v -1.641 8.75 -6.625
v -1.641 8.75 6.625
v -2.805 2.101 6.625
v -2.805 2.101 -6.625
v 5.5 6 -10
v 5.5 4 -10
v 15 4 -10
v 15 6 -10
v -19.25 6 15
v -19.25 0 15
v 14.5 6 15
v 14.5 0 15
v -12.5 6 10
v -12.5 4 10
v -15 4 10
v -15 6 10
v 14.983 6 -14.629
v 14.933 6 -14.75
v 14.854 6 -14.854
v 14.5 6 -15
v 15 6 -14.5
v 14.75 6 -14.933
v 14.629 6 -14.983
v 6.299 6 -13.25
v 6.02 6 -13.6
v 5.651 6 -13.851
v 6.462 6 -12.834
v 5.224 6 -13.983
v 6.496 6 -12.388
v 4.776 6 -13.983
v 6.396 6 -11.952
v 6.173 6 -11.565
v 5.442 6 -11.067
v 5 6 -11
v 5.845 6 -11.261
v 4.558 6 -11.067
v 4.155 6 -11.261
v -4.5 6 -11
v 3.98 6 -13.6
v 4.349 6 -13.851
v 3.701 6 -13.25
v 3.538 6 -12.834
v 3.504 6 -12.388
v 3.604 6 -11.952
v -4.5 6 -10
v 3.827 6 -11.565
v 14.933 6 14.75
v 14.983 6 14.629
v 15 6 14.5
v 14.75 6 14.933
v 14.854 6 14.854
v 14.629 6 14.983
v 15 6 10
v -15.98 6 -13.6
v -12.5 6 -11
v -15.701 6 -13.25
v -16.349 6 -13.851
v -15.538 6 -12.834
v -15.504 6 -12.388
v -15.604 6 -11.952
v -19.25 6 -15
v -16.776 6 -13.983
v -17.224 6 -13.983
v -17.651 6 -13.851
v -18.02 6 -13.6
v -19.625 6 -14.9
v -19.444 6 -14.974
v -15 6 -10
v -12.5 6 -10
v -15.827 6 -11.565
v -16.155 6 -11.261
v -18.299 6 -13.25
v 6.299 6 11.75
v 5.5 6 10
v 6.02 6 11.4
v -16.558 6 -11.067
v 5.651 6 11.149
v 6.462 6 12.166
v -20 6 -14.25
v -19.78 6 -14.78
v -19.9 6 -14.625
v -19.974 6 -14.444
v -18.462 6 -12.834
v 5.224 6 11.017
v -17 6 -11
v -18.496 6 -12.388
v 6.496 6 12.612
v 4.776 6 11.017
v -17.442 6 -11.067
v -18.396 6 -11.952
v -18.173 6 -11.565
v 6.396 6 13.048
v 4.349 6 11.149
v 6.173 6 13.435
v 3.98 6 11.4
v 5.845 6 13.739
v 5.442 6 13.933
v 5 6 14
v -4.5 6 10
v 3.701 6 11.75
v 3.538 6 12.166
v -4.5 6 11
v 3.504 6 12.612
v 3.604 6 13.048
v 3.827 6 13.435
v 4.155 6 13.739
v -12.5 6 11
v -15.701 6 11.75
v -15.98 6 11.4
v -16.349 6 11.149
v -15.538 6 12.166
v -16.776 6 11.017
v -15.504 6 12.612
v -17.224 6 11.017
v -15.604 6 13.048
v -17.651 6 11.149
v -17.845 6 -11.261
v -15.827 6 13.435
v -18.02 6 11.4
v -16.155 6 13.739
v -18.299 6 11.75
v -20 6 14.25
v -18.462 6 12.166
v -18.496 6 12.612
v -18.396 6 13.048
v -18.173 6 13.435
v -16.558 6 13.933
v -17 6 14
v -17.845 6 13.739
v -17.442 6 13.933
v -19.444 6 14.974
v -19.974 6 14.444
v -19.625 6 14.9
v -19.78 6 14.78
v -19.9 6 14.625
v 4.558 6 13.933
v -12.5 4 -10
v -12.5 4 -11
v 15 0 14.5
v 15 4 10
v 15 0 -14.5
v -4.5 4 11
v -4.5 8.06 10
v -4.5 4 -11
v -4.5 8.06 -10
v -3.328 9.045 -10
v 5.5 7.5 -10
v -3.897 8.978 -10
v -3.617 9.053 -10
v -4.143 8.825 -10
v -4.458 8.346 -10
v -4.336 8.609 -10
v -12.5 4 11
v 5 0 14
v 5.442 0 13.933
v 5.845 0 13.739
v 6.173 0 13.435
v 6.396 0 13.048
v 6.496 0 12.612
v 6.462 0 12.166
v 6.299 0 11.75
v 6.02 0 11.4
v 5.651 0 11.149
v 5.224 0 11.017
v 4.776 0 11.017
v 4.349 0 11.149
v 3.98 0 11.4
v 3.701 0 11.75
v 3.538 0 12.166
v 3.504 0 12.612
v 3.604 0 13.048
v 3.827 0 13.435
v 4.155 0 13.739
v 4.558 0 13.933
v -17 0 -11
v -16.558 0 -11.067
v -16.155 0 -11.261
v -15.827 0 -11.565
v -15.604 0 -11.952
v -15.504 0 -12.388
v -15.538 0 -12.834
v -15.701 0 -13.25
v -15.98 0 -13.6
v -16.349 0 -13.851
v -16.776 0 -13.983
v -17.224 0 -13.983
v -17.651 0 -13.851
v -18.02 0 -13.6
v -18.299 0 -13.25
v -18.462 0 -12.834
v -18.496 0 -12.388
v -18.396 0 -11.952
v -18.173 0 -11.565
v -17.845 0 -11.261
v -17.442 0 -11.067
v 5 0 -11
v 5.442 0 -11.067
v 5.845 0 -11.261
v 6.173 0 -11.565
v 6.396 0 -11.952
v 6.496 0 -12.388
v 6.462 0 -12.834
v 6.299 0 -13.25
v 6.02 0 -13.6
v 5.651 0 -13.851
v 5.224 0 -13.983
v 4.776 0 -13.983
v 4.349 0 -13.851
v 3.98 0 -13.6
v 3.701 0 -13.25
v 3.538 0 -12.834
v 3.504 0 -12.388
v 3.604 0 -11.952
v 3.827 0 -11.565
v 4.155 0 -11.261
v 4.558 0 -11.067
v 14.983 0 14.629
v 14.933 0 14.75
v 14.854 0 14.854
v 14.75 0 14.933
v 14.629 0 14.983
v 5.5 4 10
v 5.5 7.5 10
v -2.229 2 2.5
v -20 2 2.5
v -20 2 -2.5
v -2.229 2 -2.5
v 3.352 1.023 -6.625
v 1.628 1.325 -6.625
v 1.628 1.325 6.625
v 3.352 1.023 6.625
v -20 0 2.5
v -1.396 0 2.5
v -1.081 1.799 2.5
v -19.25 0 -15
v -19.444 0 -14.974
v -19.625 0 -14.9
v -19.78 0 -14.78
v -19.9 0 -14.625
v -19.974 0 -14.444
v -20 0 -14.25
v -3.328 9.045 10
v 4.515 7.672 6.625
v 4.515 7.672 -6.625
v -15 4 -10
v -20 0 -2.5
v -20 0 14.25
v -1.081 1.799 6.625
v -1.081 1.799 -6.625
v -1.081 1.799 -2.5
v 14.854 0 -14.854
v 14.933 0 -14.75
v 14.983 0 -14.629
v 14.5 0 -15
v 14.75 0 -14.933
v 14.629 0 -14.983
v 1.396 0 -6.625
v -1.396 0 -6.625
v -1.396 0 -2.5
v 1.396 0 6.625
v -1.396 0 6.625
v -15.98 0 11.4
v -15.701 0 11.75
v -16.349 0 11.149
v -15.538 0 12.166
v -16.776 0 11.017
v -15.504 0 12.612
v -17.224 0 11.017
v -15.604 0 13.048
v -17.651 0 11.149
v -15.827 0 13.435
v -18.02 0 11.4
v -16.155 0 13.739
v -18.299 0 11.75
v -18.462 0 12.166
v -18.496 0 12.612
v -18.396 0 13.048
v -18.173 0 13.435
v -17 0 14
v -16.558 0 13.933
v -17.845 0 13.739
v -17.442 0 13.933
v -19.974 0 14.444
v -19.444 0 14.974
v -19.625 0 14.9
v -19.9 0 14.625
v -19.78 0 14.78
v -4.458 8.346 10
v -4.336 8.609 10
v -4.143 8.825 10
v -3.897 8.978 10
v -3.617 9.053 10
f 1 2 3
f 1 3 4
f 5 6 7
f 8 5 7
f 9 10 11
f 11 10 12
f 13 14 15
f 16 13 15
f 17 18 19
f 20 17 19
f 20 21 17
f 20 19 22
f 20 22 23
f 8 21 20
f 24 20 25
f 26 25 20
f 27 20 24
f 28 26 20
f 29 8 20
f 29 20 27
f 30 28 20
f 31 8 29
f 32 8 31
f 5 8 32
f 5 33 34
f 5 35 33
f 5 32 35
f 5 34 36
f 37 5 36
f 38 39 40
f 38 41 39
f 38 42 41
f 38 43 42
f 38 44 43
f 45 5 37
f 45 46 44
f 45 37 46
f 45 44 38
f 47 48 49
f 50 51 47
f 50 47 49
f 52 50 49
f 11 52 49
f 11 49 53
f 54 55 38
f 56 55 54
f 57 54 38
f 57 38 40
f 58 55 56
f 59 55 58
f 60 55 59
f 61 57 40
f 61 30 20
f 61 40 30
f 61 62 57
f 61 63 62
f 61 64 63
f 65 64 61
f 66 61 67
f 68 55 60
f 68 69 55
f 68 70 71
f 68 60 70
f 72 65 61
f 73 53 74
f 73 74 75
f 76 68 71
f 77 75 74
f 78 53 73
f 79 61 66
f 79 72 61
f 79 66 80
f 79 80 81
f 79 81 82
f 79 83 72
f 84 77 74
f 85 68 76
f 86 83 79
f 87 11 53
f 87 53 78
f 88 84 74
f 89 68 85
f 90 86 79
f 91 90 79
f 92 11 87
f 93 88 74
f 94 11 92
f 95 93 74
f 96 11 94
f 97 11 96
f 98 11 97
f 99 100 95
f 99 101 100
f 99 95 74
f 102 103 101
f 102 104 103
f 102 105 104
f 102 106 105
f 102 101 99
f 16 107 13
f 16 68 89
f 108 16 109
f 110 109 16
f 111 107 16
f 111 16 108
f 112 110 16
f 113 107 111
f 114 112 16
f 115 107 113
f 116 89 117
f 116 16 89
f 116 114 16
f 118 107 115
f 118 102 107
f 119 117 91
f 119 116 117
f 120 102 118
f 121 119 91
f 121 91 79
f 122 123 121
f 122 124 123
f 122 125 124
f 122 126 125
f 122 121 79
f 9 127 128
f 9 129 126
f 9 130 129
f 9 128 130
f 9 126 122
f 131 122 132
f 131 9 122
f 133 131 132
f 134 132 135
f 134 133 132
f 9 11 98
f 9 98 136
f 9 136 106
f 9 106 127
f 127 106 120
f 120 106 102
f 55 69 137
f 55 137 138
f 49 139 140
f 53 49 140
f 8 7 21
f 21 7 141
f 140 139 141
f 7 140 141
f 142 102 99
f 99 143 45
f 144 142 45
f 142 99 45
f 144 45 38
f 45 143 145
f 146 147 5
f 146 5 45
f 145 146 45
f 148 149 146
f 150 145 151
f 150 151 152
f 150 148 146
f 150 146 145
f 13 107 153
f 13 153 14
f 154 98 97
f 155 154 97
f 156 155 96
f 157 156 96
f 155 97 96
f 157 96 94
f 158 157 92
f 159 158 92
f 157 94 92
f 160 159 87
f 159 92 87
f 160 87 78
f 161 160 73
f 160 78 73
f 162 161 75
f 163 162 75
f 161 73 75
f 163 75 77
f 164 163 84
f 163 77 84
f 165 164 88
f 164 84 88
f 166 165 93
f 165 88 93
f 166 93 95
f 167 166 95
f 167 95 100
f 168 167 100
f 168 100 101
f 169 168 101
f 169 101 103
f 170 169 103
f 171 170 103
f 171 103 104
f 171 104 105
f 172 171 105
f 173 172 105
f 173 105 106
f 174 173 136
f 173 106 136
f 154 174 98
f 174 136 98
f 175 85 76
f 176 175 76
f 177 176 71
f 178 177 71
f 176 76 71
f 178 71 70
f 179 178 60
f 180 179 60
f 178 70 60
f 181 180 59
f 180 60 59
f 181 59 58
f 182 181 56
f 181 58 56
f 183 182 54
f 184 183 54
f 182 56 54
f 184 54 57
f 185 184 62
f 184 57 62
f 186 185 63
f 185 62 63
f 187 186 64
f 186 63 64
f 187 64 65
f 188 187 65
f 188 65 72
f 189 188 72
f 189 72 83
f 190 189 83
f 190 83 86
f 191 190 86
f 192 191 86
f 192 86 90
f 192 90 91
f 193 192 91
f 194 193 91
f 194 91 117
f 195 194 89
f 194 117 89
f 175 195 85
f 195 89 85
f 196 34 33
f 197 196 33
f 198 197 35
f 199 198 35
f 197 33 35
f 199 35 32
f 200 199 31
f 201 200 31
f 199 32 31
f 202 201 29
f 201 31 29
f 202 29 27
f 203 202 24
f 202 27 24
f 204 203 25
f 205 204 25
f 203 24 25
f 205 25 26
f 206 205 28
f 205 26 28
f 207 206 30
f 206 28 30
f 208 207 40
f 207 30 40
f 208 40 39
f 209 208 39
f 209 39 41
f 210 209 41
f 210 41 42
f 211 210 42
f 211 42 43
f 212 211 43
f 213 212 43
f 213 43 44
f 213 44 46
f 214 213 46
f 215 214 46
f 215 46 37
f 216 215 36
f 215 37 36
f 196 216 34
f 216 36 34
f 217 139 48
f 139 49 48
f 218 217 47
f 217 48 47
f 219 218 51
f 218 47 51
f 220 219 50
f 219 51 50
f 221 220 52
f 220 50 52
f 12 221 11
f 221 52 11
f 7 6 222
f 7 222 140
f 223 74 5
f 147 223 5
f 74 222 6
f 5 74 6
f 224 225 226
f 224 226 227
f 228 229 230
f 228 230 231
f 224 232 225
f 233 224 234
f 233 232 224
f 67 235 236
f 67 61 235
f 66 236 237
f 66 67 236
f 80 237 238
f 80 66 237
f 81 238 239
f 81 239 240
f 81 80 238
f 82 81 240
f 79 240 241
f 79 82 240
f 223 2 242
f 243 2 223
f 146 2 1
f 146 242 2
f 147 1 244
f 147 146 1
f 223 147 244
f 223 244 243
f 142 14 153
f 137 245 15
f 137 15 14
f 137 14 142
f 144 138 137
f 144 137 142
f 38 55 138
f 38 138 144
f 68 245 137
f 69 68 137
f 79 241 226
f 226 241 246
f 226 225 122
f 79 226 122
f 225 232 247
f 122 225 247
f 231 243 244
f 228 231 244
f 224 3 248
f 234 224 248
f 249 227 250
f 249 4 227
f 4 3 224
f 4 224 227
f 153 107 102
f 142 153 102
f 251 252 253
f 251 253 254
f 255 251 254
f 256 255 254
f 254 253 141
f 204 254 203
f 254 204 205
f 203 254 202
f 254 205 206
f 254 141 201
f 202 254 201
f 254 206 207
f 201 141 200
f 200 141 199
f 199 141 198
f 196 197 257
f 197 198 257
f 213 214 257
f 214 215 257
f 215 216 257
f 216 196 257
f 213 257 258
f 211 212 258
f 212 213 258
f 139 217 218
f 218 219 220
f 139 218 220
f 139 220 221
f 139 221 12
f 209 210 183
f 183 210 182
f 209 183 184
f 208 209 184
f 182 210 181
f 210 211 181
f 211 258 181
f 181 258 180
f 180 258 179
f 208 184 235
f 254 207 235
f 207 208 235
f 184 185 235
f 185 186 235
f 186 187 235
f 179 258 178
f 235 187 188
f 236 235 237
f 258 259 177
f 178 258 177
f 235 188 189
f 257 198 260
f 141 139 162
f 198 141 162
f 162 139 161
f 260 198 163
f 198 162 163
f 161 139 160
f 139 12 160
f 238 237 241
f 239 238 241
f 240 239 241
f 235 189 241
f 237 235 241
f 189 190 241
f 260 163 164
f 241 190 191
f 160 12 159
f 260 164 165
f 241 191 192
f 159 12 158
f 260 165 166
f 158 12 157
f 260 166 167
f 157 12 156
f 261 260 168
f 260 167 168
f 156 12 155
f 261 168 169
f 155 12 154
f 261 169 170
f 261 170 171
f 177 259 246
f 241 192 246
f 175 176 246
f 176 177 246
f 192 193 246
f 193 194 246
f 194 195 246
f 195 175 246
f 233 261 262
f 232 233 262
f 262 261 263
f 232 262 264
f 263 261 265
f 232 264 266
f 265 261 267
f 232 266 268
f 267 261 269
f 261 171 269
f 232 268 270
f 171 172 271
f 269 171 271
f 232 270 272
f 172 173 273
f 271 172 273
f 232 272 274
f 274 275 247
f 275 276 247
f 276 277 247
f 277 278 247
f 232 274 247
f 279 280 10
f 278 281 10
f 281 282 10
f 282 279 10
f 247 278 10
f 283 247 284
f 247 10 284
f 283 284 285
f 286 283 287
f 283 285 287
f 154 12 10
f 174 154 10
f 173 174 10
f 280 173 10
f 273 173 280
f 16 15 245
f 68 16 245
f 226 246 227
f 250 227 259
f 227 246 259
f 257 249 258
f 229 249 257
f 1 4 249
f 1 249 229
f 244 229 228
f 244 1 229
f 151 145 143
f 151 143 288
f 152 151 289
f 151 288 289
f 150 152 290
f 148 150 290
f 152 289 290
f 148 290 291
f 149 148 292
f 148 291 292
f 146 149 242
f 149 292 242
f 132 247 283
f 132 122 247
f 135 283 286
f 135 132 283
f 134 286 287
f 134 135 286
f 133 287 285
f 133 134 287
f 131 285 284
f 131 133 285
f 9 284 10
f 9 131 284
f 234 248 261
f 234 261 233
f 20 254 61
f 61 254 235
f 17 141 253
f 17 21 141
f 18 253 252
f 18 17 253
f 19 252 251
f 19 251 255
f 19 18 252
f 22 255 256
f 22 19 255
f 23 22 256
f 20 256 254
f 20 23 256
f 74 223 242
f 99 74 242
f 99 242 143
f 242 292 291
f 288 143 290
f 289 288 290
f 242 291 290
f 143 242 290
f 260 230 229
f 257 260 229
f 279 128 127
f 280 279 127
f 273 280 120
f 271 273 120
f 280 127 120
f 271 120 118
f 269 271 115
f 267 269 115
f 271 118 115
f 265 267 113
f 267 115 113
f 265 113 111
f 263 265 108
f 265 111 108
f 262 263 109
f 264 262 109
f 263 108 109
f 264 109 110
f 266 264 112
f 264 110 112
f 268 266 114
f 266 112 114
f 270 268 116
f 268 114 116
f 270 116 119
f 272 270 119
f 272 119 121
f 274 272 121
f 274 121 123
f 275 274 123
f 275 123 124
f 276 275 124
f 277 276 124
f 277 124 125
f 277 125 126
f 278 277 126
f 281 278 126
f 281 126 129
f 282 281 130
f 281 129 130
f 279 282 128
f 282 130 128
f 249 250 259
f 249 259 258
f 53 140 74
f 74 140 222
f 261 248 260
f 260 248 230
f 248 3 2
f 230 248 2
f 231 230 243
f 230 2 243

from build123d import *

# Parameters (mm, degrees)
SKETCH1_W                = 30
SKETCH1_H                = 20
BASE_PLATE_DEPTH         = 1
SIDE_WALLS_DEPTH         = 6
SKETCH3_W                = 10
SKETCH3_H                = 20
SWITCH_BLOCK_DEPTH       = 6.5
SKETCH11_W               = 10.5
SKETCH11_H               = 20
SKETCH11_W_2             = 9.5
THICKER_BODY_DEPTH       = 3
SWITCH_BLOCK_ANGLE_DEPTH = 20
SKETCH4_R                = 1.5
M2_SCREWS_DEPTH          = 6
FILLET1_R                = 1
FILLET2_R                = 0.5
FILLET3_R                = 0.5
FILLET4_R                = 0.75
FILLET5_R                = 0.75
SKETCH19_W               = 8
SKETCH19_H               = 22
SPACE_FOR_LEAVER_DEPTH   = 2
SKETCH22_W               = 6.25
SKETCH22_H               = 13.25
SWITCH_DEPTH             = 6.75
SKETCH23_W               = 2.75
SKETCH23_H               = 13.25
CUT_EXTRUDE2_DEPTH       = 27.310171552
SKETCH24_W               = 20
SKETCH24_H               = 5
CUT_EXTRUDE3_DEPTH       = 2


with BuildPart() as part:
    # Sketch1 → Base Plate (new body)
    with BuildSketch(Plane(origin=(0, 0, 0), x_dir=(1, 0, 0), z_dir=(0, 1, 0))):
        Rectangle(SKETCH1_W, SKETCH1_H)
    extrude(amount=BASE_PLATE_DEPTH)

    # Sketch2 → Side Walls (add)
    with BuildSketch(Plane.XZ):
        Polygon((15, 10), (-15, 10), (-15, -10), (15, -10), (15, -15), (-20, -15), (-20, 15), (15, 15), align=None)
    extrude(amount=-SIDE_WALLS_DEPTH)

    # Sketch3 → Switch Block (add)
    with BuildSketch(Plane(origin=(0, 1, 0), x_dir=(1, 0, 0), z_dir=(0, 1, 0))):
        with Locations((0.5, 0)):
            Rectangle(SKETCH3_W, SKETCH3_H)
    extrude(amount=SWITCH_BLOCK_DEPTH)

    # Sketch11 → Thicker Body (add)
    with BuildSketch(Plane(origin=(0, 1, 0), x_dir=(1, 0, 0), z_dir=(0, 1, 0))):
        with Locations((-9.75, 0)):
            Rectangle(SKETCH11_W, SKETCH11_H)
        with Locations((10.25, 0)):
            Rectangle(SKETCH11_W_2, SKETCH11_H)
    extrude(amount=THICKER_BODY_DEPTH)

    # Sketch5 → Switch Block Angle (add)
    with BuildSketch(Plane(origin=(0, 0, -10), x_dir=(-1, 0, 0), z_dir=(0, 0, -1))):
        Polygon((4.5, 7.5), (4.5, 9.25), (-5.5, 7.5), align=None)
    extrude(amount=-SWITCH_BLOCK_ANGLE_DEPTH)

    # Sketch4 → M2 Screws (cut)
    with BuildSketch(Plane(origin=(0, 6, 0), x_dir=(1, 0, 0), z_dir=(0, 1, 0))):
        with Locations(Location((-17, -12.5, 0), (0, 0, 270))):
            Circle(SKETCH4_R)
        with Locations(Location((5, -12.5, 0), (0, 0, 270))):
            Circle(SKETCH4_R)
        with Locations(Location((5, 12.5, 0), (0, 0, 270))):
            Circle(SKETCH4_R)
        with Locations(Location((-17, 12.5, 0), (0, 0, 270))):
            Circle(SKETCH4_R)
    extrude(amount=-M2_SCREWS_DEPTH, mode=Mode.SUBTRACT)

    # Fillet1
    fillet1_edges = [part.edges().sort_by_distance(p)[0] for p in [
        (-4.5, 9.25, 0),
    ]]
    fillet(fillet1_edges, radius=FILLET1_R)

    # Fillet2
    fillet2_edges = [part.edges().sort_by_distance(p)[0] for p in [
        (15, 3, 15),
    ]]
    fillet(fillet2_edges, radius=FILLET2_R)

    # Fillet3
    fillet3_edges = [part.edges().sort_by_distance(p)[0] for p in [
        (15, 3, -15),
    ]]
    fillet(fillet3_edges, radius=FILLET3_R)

    # Fillet4
    fillet4_edges = [part.edges().sort_by_distance(p)[0] for p in [
        (-20, 3, -15),
    ]]
    fillet(fillet4_edges, radius=FILLET4_R)

    # Fillet5
    fillet5_edges = [part.edges().sort_by_distance(p)[0] for p in [
        (-20, 3, 15),
    ]]
    fillet(fillet5_edges, radius=FILLET5_R)

    # Sketch19 → Space for LEaver (cut)
    with BuildSketch(Plane(origin=(0, 6, 0), x_dir=(1, 0, 0), z_dir=(0, 1, 0))):
        with Locations((-8.5, 0)):
            Rectangle(SKETCH19_W, SKETCH19_H)
    extrude(amount=-SPACE_FOR_LEAVER_DEPTH, mode=Mode.SUBTRACT)

    # Sketch22 → Switch (cut)
    with BuildSketch(Plane(origin=(1.436931474, 8.211036992, 0), x_dir=(0.9850304671557042, -0.1723803317522482, 0), z_dir=(0.1723803317522482, 0.9850304671557042, 0))):
        Rectangle(SKETCH22_W, SKETCH22_H)
    extrude(amount=-SWITCH_DEPTH, mode=Mode.SUBTRACT)

    # Sketch23 → Cut-Extrude2 (cut, through all)
    with BuildSketch(Plane(origin=(0.273364234, 1.562081339, 0), x_dir=(0.9850304671557042, -0.1723803317522482, 0), z_dir=(0.1723803317522482, 0.9850304671557042, 0))):
        Rectangle(SKETCH23_W, SKETCH23_H)
    extrude(amount=-CUT_EXTRUDE2_DEPTH, mode=Mode.SUBTRACT)

    # Sketch24 → Cut-Extrude3 (cut)
    with BuildSketch(Plane.XZ):
        with Locations((-10, 0)):
            Rectangle(SKETCH24_W, SKETCH24_H)
    extrude(amount=-CUT_EXTRUDE3_DEPTH, mode=Mode.SUBTRACT)


solid = part.part
